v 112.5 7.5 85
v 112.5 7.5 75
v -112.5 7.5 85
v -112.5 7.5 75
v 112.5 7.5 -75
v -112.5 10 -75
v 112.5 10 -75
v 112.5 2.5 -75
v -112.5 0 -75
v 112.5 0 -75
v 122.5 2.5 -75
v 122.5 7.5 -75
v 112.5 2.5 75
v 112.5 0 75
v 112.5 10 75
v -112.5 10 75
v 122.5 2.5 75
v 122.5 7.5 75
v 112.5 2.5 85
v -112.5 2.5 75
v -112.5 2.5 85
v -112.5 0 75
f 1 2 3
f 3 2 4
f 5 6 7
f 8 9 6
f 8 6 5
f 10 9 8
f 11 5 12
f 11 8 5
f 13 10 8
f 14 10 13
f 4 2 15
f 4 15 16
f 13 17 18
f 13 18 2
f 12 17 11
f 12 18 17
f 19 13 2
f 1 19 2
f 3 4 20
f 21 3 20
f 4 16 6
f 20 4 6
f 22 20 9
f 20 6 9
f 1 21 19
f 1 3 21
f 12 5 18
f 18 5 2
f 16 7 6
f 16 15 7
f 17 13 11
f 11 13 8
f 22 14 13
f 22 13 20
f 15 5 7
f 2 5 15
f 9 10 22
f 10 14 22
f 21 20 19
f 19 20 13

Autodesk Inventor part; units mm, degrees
ref_plane "YZ Plane" through (0, 0, 0) normal (1, 0, 0) x (0, 1, 0)
ref_plane "XZ Plane" through (0, 0, 0) normal (0, 1, 0) x (-1, 0, 0)
ref_plane "XY Plane" through (0, 0, 0) normal (0, 0, 1) x (1, 0, 0)
sketch "Sketch1" plane through (0, 0, 0) normal (0, 1, 0) x (-1, 0, 0)
  line L0 (-112.5, 75) -> (112.5, 75)
  line L1 (112.5, 75) -> (112.5, -75)
  line L2 (112.5, -75) -> (-112.5, -75)
  line L3 (-112.5, -75) -> (-112.5, 75)
  line L4 (-112.5, 75) -> (112.5, -75) construction
  line L5 (112.5, 75) -> (-112.5, -75) construction
  point P0 (0, 0)
  dimension "d0" = 225
  dimension "d1" = 150
extrude "Extrusion1" add sketch "Sketch1" along normal blind 10
sketch "Sketch2" plane through (112.5, 0, 75) normal (1, 0, 0) x (0, 0, -1)
  line L0 (0, 2.5) -> (150, 2.5)
  line L1 (150, 2.5) -> (150, 7.5)
  line L2 (150, 7.5) -> (0, 7.5)
  line L3 (0, 7.5) -> (0, 2.5)
  point P0 (75, 0)
  point P1 (0, 5)
  dimension "d4" = 150
  dimension "d5" = 5
extrude "Extrusion2" add sketch "Sketch2" along normal blind 10
sketch "Sketch3" plane through (-112.5, 0, 75) normal (0, 0, 1) x (1, 0, 0)
  line L0 (0, 2.5) -> (225, 2.5)
  line L1 (225, 2.5) -> (225, 7.5)
  line L2 (225, 7.5) -> (0, 7.5)
  line L3 (0, 7.5) -> (0, 2.5)
  point P0 (112.5, 0)
  dimension "d8" = 225
  dimension "d9" = 5
extrude "Extrusion3" add sketch "Sketch3" along normal blind 10
properties part number "TSU_Baseplate"
